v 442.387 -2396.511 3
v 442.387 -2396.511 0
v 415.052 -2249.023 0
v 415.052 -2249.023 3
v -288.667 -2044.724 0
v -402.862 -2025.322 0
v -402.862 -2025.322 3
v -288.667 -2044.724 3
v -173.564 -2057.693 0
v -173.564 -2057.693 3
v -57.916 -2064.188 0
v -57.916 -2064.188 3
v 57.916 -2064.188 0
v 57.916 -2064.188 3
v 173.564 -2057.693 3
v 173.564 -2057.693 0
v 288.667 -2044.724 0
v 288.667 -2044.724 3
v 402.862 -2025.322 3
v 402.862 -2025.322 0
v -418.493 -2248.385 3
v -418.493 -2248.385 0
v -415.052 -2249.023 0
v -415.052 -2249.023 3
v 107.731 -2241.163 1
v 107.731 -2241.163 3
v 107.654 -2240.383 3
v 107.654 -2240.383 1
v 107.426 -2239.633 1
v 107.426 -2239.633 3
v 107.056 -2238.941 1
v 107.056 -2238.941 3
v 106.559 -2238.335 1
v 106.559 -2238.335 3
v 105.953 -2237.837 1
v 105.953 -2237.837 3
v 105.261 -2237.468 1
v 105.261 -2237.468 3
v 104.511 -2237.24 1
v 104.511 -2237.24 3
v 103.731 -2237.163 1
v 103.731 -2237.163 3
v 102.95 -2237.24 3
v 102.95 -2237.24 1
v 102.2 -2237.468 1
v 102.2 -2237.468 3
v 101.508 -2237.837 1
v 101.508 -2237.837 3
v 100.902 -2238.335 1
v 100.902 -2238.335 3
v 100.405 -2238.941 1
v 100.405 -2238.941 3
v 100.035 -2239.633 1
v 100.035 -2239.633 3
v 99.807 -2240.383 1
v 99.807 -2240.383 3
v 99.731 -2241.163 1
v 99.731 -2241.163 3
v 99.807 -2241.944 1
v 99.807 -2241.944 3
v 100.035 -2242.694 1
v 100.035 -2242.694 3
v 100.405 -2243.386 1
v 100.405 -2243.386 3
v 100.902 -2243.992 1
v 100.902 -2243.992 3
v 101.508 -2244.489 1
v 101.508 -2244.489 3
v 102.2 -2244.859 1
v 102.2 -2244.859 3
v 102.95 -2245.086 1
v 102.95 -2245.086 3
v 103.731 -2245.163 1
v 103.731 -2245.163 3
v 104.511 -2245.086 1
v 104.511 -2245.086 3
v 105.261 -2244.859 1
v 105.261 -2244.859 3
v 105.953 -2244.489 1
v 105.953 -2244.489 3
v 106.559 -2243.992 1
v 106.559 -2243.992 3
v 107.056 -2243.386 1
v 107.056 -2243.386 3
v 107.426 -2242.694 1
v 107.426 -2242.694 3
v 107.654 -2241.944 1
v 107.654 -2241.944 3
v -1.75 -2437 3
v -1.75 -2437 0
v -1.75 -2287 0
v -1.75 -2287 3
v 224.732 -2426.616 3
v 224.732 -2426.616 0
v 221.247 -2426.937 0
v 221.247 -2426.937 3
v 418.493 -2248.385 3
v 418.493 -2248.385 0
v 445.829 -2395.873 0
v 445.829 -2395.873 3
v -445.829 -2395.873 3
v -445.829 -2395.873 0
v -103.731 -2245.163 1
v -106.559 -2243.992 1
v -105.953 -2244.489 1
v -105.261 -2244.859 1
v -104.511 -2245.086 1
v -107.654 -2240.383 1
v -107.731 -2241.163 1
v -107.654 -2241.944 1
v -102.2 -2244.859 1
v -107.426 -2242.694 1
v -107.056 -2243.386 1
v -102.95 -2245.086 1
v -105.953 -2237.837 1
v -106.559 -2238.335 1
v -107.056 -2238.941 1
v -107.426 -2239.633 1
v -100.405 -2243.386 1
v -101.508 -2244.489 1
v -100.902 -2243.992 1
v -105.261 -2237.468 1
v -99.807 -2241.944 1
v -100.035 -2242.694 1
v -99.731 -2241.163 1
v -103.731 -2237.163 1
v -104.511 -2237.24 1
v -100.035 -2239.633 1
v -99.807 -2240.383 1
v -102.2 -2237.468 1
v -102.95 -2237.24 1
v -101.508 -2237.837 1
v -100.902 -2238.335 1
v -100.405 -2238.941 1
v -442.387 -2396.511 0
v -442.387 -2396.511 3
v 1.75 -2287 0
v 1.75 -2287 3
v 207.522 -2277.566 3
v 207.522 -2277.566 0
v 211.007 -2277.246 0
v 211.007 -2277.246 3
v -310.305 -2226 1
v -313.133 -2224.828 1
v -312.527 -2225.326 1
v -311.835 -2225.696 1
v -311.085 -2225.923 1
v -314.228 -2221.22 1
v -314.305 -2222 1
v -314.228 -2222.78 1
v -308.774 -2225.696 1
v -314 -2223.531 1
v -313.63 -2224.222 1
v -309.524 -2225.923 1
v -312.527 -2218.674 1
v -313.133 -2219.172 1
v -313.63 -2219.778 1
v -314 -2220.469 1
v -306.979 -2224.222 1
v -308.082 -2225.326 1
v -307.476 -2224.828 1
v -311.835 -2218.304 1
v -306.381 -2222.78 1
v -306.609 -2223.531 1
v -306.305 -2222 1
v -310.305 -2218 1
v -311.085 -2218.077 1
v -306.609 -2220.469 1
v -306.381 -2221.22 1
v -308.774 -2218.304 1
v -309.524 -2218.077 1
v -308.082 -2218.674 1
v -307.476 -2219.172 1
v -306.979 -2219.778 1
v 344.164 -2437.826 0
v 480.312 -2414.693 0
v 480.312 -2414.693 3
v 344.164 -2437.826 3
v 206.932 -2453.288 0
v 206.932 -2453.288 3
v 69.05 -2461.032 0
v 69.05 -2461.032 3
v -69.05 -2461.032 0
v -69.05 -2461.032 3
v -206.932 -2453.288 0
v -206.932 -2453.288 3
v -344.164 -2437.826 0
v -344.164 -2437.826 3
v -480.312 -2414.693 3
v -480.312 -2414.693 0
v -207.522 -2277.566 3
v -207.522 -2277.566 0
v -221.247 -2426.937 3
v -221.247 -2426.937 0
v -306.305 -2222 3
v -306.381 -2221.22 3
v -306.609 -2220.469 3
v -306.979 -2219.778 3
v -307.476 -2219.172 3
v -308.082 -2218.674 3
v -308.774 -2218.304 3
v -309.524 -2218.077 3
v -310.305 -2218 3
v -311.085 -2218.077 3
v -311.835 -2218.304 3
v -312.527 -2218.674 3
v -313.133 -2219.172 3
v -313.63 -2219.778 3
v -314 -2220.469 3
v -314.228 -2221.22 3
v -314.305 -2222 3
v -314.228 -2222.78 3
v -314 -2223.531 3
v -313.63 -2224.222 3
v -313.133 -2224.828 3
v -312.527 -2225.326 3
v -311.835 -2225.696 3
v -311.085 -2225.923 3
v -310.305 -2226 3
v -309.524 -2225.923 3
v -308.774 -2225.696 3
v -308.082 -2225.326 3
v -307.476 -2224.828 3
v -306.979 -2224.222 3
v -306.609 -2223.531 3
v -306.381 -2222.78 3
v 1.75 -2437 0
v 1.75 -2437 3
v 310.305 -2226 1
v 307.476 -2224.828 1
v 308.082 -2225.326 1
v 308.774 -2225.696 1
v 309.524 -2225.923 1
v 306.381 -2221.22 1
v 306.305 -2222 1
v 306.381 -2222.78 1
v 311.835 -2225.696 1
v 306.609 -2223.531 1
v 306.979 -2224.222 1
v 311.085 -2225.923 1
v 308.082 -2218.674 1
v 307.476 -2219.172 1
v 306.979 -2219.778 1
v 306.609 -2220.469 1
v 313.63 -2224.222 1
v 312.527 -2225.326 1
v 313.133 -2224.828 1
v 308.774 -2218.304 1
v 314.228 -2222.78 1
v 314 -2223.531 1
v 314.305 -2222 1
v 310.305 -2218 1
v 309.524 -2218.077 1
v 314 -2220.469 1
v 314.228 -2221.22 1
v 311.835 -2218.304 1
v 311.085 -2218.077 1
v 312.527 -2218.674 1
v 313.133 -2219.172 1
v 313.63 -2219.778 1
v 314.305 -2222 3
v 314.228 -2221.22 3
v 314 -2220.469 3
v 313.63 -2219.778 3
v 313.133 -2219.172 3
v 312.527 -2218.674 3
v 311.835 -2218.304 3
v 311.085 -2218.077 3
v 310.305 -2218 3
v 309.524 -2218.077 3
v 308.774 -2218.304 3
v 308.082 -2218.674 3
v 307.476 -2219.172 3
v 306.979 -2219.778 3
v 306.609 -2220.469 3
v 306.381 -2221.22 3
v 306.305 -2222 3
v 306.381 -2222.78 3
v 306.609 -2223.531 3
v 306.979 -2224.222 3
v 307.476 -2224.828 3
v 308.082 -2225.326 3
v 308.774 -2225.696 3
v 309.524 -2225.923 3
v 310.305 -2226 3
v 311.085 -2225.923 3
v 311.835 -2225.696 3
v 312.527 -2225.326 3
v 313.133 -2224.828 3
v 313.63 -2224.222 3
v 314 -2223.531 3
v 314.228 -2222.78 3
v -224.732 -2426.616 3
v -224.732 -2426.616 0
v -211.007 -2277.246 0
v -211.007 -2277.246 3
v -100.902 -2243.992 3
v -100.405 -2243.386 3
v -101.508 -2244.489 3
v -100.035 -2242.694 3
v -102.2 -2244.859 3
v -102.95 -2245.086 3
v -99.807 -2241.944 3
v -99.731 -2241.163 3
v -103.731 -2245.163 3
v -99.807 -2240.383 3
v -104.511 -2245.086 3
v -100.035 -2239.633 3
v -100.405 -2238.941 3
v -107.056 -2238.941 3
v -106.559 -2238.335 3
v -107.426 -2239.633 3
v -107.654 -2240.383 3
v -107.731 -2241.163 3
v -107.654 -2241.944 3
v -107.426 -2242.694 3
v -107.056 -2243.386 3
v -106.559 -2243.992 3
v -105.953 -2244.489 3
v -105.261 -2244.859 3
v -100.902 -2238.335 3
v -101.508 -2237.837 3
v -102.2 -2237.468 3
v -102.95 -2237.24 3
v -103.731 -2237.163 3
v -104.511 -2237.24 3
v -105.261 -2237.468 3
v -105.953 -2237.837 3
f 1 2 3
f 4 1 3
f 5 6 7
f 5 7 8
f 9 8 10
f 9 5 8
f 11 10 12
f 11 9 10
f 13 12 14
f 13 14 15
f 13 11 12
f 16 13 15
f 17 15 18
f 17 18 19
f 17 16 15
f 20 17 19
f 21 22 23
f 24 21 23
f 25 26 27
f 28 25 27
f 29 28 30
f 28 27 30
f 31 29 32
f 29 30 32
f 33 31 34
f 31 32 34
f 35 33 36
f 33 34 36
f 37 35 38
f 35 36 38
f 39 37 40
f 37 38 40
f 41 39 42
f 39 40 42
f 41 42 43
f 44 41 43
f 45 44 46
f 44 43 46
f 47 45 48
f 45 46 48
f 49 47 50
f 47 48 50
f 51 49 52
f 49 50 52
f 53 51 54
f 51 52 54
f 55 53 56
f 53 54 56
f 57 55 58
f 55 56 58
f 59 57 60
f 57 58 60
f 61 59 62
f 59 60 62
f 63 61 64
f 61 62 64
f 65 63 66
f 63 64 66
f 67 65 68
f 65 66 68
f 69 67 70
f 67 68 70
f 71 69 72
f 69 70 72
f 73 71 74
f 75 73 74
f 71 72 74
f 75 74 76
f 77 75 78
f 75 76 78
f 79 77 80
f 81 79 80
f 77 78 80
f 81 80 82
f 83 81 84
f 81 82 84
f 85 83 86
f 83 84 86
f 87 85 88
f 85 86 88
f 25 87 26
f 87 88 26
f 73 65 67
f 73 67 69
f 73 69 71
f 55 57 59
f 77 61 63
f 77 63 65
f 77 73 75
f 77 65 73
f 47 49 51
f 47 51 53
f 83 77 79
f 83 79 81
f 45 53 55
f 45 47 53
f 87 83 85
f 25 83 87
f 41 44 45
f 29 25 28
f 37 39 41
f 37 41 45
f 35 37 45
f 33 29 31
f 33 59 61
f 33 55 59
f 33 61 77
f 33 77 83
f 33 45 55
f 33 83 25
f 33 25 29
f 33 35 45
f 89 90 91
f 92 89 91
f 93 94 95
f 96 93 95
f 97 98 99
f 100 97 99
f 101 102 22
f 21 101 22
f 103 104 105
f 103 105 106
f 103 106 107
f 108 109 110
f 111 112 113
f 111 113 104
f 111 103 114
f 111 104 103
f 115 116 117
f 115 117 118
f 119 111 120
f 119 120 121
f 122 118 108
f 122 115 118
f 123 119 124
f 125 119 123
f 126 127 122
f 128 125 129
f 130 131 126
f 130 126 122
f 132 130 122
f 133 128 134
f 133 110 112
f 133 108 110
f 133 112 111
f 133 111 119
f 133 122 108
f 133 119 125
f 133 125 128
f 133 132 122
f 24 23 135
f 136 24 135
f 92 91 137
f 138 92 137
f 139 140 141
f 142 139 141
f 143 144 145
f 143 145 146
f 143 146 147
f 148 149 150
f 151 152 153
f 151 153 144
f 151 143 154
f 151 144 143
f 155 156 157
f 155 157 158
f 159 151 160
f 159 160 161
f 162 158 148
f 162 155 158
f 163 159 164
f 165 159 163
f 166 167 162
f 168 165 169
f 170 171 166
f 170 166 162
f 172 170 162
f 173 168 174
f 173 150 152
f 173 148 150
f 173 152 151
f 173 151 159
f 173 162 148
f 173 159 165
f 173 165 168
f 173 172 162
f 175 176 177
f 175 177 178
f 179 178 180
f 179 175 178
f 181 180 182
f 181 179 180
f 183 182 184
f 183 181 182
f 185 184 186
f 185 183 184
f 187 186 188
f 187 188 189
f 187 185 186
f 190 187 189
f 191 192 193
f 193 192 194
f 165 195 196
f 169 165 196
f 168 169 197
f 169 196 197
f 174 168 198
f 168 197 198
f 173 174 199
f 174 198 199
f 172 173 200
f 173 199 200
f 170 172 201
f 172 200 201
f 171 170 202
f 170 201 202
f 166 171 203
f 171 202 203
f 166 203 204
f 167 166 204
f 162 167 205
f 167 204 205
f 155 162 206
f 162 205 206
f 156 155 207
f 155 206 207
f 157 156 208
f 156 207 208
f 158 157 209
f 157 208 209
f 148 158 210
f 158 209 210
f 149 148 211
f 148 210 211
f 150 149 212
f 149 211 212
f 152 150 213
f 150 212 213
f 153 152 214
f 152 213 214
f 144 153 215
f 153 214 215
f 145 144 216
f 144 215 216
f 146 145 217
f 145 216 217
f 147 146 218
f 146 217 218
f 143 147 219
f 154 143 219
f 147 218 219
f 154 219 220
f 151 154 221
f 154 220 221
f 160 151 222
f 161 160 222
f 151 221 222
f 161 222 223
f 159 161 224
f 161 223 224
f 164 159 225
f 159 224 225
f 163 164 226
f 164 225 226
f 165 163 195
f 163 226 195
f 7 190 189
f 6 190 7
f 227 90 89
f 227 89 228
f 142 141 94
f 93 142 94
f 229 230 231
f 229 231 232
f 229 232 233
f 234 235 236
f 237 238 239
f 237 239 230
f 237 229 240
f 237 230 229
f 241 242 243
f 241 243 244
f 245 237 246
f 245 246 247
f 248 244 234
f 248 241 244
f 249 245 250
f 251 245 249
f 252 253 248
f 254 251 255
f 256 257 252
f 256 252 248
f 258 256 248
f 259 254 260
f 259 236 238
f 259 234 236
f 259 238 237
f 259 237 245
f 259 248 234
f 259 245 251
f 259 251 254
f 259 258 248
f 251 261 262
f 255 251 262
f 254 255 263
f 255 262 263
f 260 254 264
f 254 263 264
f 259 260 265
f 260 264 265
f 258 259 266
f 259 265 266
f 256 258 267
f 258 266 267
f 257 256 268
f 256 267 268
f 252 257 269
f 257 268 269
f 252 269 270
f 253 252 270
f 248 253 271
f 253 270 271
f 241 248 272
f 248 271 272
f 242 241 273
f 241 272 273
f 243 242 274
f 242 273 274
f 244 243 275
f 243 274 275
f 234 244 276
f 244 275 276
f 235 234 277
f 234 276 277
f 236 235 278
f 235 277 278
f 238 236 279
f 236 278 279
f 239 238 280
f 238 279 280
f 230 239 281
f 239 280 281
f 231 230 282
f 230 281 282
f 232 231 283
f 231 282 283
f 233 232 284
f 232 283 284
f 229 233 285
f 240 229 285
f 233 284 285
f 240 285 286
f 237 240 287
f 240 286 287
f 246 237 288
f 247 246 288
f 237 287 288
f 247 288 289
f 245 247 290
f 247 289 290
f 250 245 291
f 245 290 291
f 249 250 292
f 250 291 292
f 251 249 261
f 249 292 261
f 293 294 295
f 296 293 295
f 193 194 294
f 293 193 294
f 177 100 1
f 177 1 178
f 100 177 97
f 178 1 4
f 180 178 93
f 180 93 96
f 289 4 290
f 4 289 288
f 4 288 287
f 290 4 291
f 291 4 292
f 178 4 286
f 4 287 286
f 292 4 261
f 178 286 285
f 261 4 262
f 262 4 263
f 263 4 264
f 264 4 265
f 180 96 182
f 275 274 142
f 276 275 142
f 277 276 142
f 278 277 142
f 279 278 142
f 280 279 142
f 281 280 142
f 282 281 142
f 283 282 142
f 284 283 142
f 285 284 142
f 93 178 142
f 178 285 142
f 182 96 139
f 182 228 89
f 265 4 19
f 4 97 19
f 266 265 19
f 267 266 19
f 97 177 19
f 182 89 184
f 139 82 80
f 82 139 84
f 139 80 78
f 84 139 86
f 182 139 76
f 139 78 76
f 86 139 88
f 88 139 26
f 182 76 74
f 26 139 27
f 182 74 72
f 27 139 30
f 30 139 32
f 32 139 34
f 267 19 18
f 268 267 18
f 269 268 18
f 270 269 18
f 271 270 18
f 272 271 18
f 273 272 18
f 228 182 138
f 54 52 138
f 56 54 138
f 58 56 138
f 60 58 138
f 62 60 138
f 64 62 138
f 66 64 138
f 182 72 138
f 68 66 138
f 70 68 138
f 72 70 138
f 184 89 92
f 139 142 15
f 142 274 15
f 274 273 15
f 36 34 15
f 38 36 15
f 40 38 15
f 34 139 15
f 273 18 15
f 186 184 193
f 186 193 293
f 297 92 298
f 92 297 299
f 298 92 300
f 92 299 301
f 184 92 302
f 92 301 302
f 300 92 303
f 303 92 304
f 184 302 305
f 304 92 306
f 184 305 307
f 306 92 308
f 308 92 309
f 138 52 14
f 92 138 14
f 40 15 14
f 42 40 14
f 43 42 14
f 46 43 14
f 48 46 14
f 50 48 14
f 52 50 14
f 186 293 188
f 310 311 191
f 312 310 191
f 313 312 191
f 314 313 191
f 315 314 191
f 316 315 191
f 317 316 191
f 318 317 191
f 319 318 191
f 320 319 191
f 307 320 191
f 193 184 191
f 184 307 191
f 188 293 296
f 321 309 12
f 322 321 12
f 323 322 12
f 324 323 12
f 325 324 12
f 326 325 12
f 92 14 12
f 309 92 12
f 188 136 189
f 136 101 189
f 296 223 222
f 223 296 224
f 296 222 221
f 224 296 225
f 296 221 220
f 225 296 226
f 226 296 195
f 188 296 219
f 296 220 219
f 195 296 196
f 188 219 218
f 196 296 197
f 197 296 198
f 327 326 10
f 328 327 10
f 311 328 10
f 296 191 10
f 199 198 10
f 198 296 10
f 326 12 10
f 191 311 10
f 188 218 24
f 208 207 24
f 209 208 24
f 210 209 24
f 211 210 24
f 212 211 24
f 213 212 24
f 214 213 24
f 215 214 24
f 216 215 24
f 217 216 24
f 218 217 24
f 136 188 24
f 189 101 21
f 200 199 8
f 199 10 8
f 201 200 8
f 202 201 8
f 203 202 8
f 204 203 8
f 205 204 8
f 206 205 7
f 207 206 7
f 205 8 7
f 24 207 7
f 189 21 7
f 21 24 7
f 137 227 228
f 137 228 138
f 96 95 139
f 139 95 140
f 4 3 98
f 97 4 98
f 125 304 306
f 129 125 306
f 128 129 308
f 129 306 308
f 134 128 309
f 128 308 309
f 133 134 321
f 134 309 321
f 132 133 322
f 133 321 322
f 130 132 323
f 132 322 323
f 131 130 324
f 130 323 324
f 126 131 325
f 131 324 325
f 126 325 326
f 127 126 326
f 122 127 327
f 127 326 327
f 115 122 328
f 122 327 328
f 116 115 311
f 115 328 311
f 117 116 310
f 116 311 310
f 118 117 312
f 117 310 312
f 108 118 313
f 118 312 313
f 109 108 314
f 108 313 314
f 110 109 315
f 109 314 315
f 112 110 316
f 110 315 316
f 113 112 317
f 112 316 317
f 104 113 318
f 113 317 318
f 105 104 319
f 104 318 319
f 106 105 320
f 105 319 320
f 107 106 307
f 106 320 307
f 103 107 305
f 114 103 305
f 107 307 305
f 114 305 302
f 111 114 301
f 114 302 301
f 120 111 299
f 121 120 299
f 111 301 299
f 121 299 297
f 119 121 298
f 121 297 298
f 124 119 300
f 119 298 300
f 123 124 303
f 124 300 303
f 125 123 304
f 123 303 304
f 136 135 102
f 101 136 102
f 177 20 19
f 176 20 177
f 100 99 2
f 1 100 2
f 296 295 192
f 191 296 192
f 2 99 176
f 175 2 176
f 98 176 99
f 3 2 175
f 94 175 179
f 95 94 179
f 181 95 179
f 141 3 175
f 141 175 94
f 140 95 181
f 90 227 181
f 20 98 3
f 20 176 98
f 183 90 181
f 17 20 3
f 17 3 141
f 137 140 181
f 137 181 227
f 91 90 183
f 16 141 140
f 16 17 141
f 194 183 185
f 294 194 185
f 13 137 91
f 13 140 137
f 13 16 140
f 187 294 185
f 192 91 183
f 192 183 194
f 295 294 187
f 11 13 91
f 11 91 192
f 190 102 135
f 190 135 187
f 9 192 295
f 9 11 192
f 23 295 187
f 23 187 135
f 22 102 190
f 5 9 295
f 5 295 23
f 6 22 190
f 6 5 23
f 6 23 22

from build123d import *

# Parameters (mm, degrees)
SKETCH1_W           = 3.5
SKETCH1_H           = 150
BOSS_EXTRUDE1_DEPTH = 3
SKETCH3_R           = 4
CUT_EXTRUDE1_DEPTH  = 2


with BuildPart() as part:
    # Sketch1 → Boss-Extrude1 (new body)
    with BuildSketch(Plane.XY):
        with BuildLine():
            Line((-480.312372804, -2414.693360353), (-402.861514963, -2025.321604033))
            ThreePointArc((-402.861514963, -2025.321604033), (0, -2065), (402.861514963, -2025.321604033))
            Line((402.861514963, -2025.321604033), (480.312372804, -2414.693360353))
            ThreePointArc((480.312372804, -2414.693360353), (0, -2462), (-480.312372804, -2414.693360353))
        make_face()
        Polygon((-207.52154326, -2277.565997196), (-221.246786059, -2426.936736332), (-224.732103306, -2426.616480667), (-211.006860506, -2277.245741531), align=None, mode=Mode.SUBTRACT)
        with Locations((0, -2362)):
            Rectangle(SKETCH1_W, SKETCH1_H, mode=Mode.SUBTRACT)
        Polygon((-415.051950712, -2249.022885768), (-442.387279536, -2396.511121903), (-445.828671713, -2395.873297564), (-418.493342889, -2248.385061429), align=None, mode=Mode.SUBTRACT)
        Polygon((211.006860506, -2277.245741531), (224.732103306, -2426.616480667), (221.246786059, -2426.936736332), (207.52154326, -2277.565997196), align=None, mode=Mode.SUBTRACT)
        Polygon((418.493342889, -2248.385061429), (445.828671713, -2395.873297564), (442.387279536, -2396.511121903), (415.051950712, -2249.022885768), align=None, mode=Mode.SUBTRACT)
    extrude(amount=BOSS_EXTRUDE1_DEPTH)

    # Sketch3 → Cut-Extrude1 (cut)
    with BuildSketch(Plane.XY.offset(3)):
        with Locations((310.304616094, -2222)):
            Circle(SKETCH3_R)
        with Locations((103.730524899, -2241.163299042)):
            Circle(SKETCH3_R)
        with Locations((-103.730524899, -2241.163299042)):
            Circle(SKETCH3_R)
        with Locations((-310.304616094, -2222)):
            Circle(SKETCH3_R)
    extrude(amount=-CUT_EXTRUDE1_DEPTH, mode=Mode.SUBTRACT)


solid = part.part
